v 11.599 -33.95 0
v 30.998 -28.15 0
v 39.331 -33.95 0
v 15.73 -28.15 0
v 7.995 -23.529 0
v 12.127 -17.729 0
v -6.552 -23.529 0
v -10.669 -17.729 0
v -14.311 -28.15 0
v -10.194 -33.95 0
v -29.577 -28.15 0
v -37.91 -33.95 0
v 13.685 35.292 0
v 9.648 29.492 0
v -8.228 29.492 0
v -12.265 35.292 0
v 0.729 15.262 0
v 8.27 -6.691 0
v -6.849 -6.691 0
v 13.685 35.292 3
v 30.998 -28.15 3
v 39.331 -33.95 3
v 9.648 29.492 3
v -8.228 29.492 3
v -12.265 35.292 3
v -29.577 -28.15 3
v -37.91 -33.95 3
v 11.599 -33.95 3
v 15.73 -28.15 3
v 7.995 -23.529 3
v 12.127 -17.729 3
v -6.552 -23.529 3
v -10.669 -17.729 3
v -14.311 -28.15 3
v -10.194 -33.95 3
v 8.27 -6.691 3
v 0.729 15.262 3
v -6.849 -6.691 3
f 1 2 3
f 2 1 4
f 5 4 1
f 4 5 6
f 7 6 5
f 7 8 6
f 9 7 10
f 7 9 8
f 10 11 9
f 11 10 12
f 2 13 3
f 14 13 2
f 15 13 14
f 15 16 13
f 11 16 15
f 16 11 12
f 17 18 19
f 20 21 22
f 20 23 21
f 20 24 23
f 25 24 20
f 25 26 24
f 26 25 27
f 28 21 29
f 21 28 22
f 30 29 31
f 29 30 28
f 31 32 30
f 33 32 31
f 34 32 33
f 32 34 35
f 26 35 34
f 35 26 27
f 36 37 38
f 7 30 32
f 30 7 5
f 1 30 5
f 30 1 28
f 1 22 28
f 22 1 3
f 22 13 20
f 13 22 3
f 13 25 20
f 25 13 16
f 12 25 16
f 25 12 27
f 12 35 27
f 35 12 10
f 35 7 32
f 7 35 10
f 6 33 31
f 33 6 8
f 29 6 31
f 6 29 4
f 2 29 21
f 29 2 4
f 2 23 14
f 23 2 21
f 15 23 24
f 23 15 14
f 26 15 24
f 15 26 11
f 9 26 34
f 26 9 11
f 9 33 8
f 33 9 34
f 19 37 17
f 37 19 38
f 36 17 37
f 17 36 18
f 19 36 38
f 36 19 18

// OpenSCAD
// Separate Letters - 2 Colors
// Generate one letter at a time with 2 color layers

// --- Parameters ---
Letter       = "A";
Font         = "Bebas Neue";
Letter_Size  = 60;
Padding      = 6;
Tolerance    = 0.2;
Base_Height  = 3;
Layer_Height = 4;
Part         = "Base";

$fn = 30;

module letter_shape(l, fnt) {
  resize([Letter_Size, 0, 0], auto=true)
  text(l, size=Letter_Size, font=fnt, halign="center", valign="center");
}

module base_part() {
  difference() {
    linear_extrude(Base_Height)
    offset(delta=Padding)
    letter_shape(Letter, str(Font, ":style=Bold"));

    translate([0, 0, Base_Height - Layer_Height + Tolerance])
    linear_extrude(Layer_Height + 1)
    offset(delta=Tolerance)
    letter_shape(Letter, str(Font, ":style=Bold"));
  }
}

module top_part() {
  linear_extrude(Layer_Height)
  letter_shape(Letter, str(Font, ":style=Bold"));
}

if (Part == "Base") {
  base_part();
} else if (Part == "Top") {
  translate([0, 0, Base_Height])
  top_part();
}
